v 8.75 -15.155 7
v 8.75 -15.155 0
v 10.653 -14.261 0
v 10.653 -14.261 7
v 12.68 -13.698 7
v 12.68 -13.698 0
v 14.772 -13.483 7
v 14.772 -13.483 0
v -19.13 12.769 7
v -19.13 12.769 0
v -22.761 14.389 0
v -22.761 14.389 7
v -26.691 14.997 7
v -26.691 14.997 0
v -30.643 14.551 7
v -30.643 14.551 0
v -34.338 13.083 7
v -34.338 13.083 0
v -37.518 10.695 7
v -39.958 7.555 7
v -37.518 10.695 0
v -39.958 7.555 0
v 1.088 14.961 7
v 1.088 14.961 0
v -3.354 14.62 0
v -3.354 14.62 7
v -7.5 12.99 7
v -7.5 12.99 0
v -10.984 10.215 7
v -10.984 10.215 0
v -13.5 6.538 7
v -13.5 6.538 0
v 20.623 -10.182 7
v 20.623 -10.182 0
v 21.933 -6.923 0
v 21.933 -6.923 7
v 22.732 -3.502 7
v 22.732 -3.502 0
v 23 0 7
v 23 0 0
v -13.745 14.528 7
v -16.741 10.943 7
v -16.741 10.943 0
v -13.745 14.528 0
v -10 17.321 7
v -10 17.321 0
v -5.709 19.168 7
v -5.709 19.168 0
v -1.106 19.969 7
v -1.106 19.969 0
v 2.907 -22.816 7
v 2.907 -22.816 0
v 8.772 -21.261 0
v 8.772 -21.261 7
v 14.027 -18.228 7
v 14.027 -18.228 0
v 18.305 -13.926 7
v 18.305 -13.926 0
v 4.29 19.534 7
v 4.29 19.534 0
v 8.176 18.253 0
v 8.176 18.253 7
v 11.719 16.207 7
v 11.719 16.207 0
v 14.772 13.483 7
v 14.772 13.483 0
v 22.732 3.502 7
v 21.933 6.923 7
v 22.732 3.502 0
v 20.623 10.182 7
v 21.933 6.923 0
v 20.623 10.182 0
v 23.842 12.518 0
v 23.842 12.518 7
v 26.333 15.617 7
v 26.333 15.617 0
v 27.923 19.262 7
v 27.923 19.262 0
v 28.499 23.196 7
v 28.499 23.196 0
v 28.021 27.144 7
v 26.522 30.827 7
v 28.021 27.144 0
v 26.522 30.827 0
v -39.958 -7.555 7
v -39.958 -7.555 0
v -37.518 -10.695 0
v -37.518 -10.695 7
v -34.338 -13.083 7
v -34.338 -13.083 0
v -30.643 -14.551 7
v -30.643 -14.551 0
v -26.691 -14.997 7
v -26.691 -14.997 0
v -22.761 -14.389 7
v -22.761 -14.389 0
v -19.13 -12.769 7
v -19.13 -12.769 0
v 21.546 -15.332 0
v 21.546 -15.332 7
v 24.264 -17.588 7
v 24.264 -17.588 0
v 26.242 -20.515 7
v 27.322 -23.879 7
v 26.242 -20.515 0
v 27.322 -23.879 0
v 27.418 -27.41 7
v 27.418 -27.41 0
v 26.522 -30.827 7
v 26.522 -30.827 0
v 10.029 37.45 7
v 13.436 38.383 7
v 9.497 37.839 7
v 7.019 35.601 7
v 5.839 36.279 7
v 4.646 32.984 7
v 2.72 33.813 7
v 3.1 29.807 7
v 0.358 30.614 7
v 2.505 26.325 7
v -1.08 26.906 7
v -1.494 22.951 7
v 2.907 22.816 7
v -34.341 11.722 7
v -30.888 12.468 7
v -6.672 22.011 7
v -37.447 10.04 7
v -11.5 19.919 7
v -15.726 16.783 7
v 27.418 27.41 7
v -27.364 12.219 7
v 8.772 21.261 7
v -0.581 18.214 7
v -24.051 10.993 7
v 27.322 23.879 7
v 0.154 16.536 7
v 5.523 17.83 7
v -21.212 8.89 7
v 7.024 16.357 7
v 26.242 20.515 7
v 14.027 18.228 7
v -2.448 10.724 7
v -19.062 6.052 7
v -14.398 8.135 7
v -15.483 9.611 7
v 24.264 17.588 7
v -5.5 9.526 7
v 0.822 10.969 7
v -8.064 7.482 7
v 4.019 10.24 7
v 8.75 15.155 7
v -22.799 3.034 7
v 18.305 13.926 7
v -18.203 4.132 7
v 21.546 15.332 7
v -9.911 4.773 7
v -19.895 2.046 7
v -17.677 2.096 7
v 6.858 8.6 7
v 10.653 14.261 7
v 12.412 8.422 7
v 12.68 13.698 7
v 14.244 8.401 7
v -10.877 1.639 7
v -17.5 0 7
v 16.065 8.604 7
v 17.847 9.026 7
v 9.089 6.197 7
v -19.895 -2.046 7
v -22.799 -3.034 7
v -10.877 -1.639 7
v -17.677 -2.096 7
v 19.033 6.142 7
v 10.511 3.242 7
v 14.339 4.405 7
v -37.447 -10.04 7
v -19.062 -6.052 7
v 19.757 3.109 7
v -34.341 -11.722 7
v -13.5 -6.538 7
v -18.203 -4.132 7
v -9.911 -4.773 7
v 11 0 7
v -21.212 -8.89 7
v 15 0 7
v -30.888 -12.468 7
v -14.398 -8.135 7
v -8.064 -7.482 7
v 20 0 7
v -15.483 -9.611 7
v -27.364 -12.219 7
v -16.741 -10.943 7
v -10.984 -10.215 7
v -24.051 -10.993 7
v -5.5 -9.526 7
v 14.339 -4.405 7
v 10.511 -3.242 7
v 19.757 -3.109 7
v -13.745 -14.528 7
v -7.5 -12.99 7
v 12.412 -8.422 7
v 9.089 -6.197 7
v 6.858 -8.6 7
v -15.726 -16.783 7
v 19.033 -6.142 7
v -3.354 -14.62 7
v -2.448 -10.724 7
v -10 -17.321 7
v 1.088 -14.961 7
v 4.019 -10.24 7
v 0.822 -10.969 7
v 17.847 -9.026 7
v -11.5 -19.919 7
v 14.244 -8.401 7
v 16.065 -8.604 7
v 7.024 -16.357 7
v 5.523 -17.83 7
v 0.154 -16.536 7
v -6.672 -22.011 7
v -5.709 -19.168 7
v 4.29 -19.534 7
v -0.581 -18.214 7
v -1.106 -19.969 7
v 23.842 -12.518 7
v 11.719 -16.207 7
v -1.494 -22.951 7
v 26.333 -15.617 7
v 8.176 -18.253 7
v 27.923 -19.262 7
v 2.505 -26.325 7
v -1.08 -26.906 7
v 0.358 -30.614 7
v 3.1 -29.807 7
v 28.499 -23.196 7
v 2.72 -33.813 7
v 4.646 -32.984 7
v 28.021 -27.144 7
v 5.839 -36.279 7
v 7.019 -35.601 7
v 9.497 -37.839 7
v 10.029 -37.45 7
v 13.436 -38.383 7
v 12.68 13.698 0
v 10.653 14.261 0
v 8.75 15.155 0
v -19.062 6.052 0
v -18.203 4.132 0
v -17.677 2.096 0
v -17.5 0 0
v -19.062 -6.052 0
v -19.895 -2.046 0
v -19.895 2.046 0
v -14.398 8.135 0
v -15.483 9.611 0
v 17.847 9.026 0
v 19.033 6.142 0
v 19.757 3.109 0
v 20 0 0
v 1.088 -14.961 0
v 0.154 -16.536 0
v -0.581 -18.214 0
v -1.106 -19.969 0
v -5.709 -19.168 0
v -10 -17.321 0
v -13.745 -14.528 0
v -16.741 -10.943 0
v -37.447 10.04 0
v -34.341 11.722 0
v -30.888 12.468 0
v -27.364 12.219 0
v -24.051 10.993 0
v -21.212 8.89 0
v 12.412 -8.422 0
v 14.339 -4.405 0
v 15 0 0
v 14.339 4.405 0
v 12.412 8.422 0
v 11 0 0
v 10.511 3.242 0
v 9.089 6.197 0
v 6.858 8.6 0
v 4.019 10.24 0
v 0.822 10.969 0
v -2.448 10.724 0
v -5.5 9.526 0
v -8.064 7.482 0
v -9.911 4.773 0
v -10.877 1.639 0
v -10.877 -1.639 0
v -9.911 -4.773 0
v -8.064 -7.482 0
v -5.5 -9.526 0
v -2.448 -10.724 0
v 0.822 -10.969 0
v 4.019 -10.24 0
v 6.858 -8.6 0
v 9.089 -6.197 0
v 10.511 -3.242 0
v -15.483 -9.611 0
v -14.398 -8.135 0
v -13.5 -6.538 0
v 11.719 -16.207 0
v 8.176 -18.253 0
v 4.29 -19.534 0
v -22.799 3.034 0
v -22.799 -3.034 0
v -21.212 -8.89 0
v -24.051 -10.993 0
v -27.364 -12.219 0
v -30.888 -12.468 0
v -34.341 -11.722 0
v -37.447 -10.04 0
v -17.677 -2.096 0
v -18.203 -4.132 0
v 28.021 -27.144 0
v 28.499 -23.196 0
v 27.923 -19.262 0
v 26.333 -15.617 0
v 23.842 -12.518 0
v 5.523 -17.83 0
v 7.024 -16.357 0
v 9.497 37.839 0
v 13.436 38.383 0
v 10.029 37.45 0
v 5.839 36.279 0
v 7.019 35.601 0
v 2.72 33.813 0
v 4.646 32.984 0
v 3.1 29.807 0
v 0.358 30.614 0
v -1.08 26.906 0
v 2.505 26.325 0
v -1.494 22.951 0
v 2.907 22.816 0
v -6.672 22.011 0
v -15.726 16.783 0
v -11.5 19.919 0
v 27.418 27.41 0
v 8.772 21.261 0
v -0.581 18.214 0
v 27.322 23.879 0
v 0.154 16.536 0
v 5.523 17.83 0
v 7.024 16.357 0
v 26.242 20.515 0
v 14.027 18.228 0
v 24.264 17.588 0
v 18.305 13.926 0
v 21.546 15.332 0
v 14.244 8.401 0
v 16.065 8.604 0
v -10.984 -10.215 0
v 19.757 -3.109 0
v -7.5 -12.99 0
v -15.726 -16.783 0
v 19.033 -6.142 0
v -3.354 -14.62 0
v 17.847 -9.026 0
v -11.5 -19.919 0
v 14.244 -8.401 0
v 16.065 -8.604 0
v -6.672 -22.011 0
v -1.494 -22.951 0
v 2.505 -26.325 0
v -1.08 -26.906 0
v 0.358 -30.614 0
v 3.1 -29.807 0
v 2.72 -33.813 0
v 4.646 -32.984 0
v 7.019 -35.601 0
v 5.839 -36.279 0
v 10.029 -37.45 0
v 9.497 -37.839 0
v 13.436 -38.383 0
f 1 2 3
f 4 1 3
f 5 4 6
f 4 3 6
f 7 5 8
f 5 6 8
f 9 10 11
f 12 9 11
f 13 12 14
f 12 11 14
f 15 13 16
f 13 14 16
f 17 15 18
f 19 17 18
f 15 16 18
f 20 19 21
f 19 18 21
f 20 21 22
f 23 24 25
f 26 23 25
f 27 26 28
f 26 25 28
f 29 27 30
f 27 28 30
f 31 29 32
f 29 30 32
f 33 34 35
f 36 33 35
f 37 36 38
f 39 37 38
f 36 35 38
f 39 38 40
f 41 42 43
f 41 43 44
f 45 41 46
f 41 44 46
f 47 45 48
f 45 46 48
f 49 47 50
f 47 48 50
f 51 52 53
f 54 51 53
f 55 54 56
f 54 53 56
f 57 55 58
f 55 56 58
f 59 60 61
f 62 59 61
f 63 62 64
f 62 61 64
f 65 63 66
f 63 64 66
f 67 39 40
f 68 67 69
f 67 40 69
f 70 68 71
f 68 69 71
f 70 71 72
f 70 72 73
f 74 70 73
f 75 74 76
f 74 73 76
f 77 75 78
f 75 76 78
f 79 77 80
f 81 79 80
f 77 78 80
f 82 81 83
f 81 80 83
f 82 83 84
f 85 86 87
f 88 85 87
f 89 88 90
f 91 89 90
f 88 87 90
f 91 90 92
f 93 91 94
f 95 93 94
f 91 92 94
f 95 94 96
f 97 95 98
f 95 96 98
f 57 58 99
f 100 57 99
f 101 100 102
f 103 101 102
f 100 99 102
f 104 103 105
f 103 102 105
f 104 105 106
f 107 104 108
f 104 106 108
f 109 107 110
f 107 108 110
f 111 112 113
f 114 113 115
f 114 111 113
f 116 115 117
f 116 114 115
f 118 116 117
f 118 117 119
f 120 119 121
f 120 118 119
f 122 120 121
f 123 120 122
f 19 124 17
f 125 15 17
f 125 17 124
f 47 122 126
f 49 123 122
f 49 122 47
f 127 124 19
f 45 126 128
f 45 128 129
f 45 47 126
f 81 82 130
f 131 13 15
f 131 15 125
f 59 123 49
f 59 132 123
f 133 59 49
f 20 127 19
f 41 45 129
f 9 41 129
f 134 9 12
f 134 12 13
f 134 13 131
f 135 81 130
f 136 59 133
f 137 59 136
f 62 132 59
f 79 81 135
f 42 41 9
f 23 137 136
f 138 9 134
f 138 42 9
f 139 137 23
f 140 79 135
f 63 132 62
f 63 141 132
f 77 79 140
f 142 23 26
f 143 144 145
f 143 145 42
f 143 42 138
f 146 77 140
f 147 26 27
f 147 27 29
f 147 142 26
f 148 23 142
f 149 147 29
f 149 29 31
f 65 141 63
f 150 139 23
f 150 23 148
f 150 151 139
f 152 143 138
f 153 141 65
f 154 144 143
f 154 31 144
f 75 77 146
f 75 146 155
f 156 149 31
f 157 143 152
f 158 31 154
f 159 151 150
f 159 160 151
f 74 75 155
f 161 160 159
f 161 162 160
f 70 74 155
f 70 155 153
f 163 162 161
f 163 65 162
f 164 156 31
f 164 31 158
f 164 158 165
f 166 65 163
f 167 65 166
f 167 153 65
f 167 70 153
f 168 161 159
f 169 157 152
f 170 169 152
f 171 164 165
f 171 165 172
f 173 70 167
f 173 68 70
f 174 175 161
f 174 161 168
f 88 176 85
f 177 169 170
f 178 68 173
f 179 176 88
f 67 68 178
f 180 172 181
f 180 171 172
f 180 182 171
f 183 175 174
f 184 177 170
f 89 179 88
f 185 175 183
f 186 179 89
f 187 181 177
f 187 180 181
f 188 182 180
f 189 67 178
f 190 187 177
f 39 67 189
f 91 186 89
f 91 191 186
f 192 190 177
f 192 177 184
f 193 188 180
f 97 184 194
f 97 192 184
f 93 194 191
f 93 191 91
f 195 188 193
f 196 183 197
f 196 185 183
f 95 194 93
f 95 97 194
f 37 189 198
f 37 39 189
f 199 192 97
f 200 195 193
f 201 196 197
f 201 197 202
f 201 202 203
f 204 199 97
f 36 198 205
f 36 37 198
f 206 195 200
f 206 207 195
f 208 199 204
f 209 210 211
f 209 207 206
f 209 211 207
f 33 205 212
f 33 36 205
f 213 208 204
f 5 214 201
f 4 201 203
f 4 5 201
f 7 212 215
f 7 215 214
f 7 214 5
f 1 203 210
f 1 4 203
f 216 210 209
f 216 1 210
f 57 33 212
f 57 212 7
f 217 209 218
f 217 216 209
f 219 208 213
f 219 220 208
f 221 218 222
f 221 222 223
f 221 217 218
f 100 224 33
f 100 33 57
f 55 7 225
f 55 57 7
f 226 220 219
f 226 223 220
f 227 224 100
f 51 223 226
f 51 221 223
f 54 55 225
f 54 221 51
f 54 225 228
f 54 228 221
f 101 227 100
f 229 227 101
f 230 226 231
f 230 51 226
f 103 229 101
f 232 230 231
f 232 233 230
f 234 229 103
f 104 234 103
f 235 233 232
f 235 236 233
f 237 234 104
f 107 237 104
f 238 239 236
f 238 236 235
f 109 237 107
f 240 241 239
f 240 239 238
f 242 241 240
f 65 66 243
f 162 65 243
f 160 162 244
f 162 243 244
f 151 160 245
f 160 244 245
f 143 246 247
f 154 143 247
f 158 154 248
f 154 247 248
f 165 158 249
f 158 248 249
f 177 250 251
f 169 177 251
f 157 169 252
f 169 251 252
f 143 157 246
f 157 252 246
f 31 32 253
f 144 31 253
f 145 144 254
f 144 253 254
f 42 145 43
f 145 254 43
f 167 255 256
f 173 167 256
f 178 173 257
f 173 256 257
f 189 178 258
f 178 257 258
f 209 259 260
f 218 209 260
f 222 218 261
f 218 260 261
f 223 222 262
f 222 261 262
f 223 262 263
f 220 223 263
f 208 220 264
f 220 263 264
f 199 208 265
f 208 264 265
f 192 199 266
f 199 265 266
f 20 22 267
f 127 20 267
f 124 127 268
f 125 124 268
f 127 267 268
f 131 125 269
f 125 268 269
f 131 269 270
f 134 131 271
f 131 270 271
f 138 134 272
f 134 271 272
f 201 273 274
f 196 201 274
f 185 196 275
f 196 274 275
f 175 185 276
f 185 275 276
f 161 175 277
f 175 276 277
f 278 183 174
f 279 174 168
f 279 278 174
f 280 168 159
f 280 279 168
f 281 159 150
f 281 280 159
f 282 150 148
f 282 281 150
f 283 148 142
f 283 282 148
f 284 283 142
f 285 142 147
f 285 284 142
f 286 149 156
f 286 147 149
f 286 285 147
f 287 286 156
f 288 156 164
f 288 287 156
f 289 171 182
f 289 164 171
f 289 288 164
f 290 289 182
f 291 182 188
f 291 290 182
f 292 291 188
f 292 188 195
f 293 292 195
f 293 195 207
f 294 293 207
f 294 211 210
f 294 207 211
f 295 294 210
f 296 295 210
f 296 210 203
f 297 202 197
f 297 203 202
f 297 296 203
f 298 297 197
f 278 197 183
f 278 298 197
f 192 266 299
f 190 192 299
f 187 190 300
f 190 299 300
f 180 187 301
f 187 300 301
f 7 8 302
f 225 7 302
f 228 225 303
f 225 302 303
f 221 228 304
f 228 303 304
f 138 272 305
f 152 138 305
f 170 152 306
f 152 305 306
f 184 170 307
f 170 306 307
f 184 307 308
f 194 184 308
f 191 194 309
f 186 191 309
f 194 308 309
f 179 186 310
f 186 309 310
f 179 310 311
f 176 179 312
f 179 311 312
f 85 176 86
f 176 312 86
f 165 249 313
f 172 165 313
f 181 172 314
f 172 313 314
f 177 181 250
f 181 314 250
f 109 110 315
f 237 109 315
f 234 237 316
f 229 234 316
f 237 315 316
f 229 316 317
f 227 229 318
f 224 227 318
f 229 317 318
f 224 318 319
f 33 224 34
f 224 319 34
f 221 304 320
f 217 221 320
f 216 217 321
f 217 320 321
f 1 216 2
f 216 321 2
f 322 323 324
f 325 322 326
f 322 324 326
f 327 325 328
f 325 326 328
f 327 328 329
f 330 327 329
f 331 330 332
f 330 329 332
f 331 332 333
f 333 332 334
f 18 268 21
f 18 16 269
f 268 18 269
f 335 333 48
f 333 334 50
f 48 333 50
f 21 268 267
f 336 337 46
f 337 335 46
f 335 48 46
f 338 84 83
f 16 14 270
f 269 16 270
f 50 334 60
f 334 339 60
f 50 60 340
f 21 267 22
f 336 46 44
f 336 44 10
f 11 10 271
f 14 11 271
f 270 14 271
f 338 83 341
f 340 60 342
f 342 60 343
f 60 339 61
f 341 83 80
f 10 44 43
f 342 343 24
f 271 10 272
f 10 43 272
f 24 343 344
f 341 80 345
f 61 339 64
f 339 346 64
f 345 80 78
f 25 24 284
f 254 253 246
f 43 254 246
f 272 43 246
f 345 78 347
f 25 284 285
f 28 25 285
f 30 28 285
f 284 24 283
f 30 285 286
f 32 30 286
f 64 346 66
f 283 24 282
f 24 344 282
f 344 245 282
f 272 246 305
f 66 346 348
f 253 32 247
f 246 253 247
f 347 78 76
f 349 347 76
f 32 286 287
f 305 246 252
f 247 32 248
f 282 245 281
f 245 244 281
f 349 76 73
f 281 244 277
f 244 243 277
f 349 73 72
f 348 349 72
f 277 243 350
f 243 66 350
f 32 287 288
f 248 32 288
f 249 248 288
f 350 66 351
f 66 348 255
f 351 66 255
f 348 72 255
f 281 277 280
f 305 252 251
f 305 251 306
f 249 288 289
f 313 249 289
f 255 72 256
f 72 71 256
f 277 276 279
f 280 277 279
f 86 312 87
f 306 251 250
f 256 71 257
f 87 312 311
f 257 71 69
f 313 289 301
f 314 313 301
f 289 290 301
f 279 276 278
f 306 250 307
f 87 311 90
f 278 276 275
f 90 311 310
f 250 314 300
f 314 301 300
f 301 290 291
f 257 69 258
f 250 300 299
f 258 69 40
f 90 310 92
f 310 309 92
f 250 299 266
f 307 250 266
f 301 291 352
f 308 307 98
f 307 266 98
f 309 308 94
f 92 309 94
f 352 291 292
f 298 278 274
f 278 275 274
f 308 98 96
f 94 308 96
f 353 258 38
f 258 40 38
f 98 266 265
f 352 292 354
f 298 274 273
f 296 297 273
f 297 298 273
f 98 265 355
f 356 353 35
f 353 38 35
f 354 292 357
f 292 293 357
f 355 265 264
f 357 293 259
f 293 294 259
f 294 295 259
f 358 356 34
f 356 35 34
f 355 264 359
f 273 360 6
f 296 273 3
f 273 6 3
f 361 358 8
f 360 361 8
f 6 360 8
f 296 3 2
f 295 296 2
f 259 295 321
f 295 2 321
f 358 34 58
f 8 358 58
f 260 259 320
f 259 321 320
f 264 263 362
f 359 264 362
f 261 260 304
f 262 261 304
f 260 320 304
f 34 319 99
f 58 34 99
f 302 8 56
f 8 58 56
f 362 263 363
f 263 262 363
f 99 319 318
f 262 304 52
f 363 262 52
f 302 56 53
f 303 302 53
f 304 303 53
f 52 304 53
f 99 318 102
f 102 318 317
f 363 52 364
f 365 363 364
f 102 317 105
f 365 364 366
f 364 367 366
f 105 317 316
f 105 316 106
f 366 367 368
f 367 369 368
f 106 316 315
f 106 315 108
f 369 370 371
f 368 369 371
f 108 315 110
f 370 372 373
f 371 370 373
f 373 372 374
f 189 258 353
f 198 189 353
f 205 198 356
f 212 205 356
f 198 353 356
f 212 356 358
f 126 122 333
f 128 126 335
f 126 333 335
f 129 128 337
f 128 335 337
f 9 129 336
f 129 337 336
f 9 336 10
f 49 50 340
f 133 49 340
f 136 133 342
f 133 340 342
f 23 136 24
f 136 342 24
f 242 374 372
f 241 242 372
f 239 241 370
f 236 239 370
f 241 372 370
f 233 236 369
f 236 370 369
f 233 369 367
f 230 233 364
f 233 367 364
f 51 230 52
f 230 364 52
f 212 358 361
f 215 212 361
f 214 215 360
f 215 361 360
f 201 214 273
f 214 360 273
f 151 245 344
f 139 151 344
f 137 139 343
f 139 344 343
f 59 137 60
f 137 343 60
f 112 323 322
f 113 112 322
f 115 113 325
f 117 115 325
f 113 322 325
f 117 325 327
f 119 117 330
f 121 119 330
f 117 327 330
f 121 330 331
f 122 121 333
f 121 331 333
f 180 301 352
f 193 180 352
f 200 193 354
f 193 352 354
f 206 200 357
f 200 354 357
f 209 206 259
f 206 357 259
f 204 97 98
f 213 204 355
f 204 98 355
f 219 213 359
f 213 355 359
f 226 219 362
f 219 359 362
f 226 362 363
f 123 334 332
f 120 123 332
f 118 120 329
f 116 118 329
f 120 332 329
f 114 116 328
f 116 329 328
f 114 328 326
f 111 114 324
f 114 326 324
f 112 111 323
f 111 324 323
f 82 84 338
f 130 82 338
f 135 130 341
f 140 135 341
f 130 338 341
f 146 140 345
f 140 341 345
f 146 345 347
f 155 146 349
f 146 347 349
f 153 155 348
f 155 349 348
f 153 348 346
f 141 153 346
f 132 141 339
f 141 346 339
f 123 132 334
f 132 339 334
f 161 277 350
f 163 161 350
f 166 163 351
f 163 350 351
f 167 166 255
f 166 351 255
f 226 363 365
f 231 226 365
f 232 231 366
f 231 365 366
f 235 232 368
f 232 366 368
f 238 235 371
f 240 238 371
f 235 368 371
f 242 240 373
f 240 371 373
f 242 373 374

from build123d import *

# Parameters (mm, degrees)
F0_R     = 11
F1_DEPTH = 7
F2_COUNT = 3


# Not quite as in the source:
# - a feature names something its author has since deleted; it is built from what else it names


with BuildPart() as f1:
    # F0 (on Top) → F1 (new body)
    with BuildSketch(Plane.XY):
        with BuildLine():
            ThreePointArc((-13.5, -6.5383484153), (3.3541019662, -14.6201915172), (15, 0))
            ThreePointArc((15, 0), (3.3541019662, 14.6201915172), (-13.5, 6.5383484153))
            ThreePointArc((-13.5, 6.5383484153), (-12.3798084828, 3.3541019662), (-12, 0))
            ThreePointArc((-12, 0), (-12.3798084828, -3.3541019662), (-13.5, -6.5383484153))
        make_face()
        Circle(F0_R, mode=Mode.SUBTRACT)
        with BuildLine():
            ThreePointArc((-12, 0), (-12.3798084828, 3.3541019662), (-13.5, 6.5383484153))
            ThreePointArc((-13.5, 6.5383484153), (-15, 0), (-13.5, -6.5383484153))
            ThreePointArc((-13.5, -6.5383484153), (-12.3798084828, -3.3541019662), (-12, 0))
        make_face()
        with BuildLine():
            ThreePointArc((-13.5, -6.5383484153), (-15, 0), (-13.5, 6.5383484153))
            ThreePointArc((-13.5, 6.5383484153), (-14.9179607249, 8.8895628102), (-16.7407407407, 10.9429246297))
            ThreePointArc((-16.7407407407, 10.9429246297), (-18.0679116501, 8.5761628135), (-19.0625, 6.0515364784))
            ThreePointArc((-19.0625, 6.0515364784), (-17.8969270431, 3.125), (-17.5, 0))
            ThreePointArc((-17.5, 0), (-17.8969270431, -3.125), (-19.0625, -6.0515364784))
            ThreePointArc((-19.0625, -6.0515364784), (-18.0679116501, -8.5761628135), (-16.7407407407, -10.9429246297))
            ThreePointArc((-16.7407407407, -10.9429246297), (-14.9179607249, -8.8895628102), (-13.5, -6.5383484153))
        make_face()
        with BuildLine():
            ThreePointArc((-19.0625, 6.0515364784), (-18.0679116501, 8.5761628135), (-16.7407407407, 10.9429246297))
            ThreePointArc((-16.7407407407, 10.9429246297), (-17.8892997113, 11.9161713755), (-19.1296296296, 12.7693880133))
            ThreePointArc((-19.1296296296, 12.7693880133), (-20.264118899, 10.879590307), (-21.2125, 8.8898731009))
            ThreePointArc((-21.2125, 8.8898731009), (-20.0359172552, 7.5476522876), (-19.0625, 6.0515364784))
        make_face()
        with BuildLine():
            ThreePointArc((-19.1296296296, 12.7693880133), (-17.8892997113, 11.9161713755), (-16.7407407407, 10.9429246297))
            ThreePointArc((-16.7407407407, 10.9429246297), (5.7089922572, 19.1678743581), (20, 0))
            ThreePointArc((20, 0), (5.7089922572, -19.1678743581), (-16.7407407407, -10.9429246297))
            ThreePointArc((-16.7407407407, -10.9429246297), (-17.8892997113, -11.9161713755), (-19.1296296296, -12.7693880133))
            ThreePointArc((-19.1296296296, -12.7693880133), (6.6715260068, -22.011150373), (23, 0))
            ThreePointArc((23, 0), (6.6715260068, 22.011150373), (-19.1296296296, 12.7693880133))
        make_face()
        with BuildLine():
            ThreePointArc((-19.1296296296, -12.7693880133), (-17.8892997113, -11.9161713755), (-16.7407407407, -10.9429246297))
            ThreePointArc((-16.7407407407, -10.9429246297), (-18.0679116501, -8.5761628135), (-19.0625, -6.0515364784))
            ThreePointArc((-19.0625, -6.0515364784), (-20.0359172552, -7.5476522876), (-21.2125, -8.8898731009))
            ThreePointArc((-21.2125, -8.8898731009), (-20.264118899, -10.879590307), (-19.1296296296, -12.7693880133))
        make_face()
        with BuildLine():
            ThreePointArc((-21.2125, 8.8898731009), (-20.264118899, 10.879590307), (-19.1296296296, 12.7693880133))
            ThreePointArc((-19.1296296296, 12.7693880133), (-30.6426207614, 14.5509901377), (-39.9583333333, 7.5552364107))
            ThreePointArc((-39.9583333333, 7.5552364107), (-30.8877085374, 12.4684390985), (-21.2125, 8.8898731009))
        make_face()
        with BuildLine():
            ThreePointArc((-19.0625, -6.0515364784), (-20, 0), (-19.0625, 6.0515364784))
            ThreePointArc((-19.0625, 6.0515364784), (-20.0359172552, 7.5476522876), (-21.2125, 8.8898731009))
            ThreePointArc((-21.2125, 8.8898731009), (-23, 0), (-21.2125, -8.8898731009))
            ThreePointArc((-21.2125, -8.8898731009), (-20.0359172552, -7.5476522876), (-19.0625, -6.0515364784))
        make_face()
        with BuildLine():
            ThreePointArc((-39.9583333333, -7.5552364107), (-30.6426207614, -14.5509901377), (-19.1296296296, -12.7693880133))
            ThreePointArc((-19.1296296296, -12.7693880133), (-20.264118899, -10.879590307), (-21.2125, -8.8898731009))
            ThreePointArc((-21.2125, -8.8898731009), (-30.8877085374, -12.4684390985), (-39.9583333333, -7.5552364107))
        make_face()
    extrude(amount=F1_DEPTH)

    # F2: F1 ×3 about axis
    f2_axis = Axis((0, 0, 0), (0, 0, 1))


with BuildPart() as f1_1:
    add(f1.part)
    for i in range(1, F2_COUNT):
        add(f1.part.rotate(f2_axis, i * 360 / F2_COUNT))


solid = f1_1.part
